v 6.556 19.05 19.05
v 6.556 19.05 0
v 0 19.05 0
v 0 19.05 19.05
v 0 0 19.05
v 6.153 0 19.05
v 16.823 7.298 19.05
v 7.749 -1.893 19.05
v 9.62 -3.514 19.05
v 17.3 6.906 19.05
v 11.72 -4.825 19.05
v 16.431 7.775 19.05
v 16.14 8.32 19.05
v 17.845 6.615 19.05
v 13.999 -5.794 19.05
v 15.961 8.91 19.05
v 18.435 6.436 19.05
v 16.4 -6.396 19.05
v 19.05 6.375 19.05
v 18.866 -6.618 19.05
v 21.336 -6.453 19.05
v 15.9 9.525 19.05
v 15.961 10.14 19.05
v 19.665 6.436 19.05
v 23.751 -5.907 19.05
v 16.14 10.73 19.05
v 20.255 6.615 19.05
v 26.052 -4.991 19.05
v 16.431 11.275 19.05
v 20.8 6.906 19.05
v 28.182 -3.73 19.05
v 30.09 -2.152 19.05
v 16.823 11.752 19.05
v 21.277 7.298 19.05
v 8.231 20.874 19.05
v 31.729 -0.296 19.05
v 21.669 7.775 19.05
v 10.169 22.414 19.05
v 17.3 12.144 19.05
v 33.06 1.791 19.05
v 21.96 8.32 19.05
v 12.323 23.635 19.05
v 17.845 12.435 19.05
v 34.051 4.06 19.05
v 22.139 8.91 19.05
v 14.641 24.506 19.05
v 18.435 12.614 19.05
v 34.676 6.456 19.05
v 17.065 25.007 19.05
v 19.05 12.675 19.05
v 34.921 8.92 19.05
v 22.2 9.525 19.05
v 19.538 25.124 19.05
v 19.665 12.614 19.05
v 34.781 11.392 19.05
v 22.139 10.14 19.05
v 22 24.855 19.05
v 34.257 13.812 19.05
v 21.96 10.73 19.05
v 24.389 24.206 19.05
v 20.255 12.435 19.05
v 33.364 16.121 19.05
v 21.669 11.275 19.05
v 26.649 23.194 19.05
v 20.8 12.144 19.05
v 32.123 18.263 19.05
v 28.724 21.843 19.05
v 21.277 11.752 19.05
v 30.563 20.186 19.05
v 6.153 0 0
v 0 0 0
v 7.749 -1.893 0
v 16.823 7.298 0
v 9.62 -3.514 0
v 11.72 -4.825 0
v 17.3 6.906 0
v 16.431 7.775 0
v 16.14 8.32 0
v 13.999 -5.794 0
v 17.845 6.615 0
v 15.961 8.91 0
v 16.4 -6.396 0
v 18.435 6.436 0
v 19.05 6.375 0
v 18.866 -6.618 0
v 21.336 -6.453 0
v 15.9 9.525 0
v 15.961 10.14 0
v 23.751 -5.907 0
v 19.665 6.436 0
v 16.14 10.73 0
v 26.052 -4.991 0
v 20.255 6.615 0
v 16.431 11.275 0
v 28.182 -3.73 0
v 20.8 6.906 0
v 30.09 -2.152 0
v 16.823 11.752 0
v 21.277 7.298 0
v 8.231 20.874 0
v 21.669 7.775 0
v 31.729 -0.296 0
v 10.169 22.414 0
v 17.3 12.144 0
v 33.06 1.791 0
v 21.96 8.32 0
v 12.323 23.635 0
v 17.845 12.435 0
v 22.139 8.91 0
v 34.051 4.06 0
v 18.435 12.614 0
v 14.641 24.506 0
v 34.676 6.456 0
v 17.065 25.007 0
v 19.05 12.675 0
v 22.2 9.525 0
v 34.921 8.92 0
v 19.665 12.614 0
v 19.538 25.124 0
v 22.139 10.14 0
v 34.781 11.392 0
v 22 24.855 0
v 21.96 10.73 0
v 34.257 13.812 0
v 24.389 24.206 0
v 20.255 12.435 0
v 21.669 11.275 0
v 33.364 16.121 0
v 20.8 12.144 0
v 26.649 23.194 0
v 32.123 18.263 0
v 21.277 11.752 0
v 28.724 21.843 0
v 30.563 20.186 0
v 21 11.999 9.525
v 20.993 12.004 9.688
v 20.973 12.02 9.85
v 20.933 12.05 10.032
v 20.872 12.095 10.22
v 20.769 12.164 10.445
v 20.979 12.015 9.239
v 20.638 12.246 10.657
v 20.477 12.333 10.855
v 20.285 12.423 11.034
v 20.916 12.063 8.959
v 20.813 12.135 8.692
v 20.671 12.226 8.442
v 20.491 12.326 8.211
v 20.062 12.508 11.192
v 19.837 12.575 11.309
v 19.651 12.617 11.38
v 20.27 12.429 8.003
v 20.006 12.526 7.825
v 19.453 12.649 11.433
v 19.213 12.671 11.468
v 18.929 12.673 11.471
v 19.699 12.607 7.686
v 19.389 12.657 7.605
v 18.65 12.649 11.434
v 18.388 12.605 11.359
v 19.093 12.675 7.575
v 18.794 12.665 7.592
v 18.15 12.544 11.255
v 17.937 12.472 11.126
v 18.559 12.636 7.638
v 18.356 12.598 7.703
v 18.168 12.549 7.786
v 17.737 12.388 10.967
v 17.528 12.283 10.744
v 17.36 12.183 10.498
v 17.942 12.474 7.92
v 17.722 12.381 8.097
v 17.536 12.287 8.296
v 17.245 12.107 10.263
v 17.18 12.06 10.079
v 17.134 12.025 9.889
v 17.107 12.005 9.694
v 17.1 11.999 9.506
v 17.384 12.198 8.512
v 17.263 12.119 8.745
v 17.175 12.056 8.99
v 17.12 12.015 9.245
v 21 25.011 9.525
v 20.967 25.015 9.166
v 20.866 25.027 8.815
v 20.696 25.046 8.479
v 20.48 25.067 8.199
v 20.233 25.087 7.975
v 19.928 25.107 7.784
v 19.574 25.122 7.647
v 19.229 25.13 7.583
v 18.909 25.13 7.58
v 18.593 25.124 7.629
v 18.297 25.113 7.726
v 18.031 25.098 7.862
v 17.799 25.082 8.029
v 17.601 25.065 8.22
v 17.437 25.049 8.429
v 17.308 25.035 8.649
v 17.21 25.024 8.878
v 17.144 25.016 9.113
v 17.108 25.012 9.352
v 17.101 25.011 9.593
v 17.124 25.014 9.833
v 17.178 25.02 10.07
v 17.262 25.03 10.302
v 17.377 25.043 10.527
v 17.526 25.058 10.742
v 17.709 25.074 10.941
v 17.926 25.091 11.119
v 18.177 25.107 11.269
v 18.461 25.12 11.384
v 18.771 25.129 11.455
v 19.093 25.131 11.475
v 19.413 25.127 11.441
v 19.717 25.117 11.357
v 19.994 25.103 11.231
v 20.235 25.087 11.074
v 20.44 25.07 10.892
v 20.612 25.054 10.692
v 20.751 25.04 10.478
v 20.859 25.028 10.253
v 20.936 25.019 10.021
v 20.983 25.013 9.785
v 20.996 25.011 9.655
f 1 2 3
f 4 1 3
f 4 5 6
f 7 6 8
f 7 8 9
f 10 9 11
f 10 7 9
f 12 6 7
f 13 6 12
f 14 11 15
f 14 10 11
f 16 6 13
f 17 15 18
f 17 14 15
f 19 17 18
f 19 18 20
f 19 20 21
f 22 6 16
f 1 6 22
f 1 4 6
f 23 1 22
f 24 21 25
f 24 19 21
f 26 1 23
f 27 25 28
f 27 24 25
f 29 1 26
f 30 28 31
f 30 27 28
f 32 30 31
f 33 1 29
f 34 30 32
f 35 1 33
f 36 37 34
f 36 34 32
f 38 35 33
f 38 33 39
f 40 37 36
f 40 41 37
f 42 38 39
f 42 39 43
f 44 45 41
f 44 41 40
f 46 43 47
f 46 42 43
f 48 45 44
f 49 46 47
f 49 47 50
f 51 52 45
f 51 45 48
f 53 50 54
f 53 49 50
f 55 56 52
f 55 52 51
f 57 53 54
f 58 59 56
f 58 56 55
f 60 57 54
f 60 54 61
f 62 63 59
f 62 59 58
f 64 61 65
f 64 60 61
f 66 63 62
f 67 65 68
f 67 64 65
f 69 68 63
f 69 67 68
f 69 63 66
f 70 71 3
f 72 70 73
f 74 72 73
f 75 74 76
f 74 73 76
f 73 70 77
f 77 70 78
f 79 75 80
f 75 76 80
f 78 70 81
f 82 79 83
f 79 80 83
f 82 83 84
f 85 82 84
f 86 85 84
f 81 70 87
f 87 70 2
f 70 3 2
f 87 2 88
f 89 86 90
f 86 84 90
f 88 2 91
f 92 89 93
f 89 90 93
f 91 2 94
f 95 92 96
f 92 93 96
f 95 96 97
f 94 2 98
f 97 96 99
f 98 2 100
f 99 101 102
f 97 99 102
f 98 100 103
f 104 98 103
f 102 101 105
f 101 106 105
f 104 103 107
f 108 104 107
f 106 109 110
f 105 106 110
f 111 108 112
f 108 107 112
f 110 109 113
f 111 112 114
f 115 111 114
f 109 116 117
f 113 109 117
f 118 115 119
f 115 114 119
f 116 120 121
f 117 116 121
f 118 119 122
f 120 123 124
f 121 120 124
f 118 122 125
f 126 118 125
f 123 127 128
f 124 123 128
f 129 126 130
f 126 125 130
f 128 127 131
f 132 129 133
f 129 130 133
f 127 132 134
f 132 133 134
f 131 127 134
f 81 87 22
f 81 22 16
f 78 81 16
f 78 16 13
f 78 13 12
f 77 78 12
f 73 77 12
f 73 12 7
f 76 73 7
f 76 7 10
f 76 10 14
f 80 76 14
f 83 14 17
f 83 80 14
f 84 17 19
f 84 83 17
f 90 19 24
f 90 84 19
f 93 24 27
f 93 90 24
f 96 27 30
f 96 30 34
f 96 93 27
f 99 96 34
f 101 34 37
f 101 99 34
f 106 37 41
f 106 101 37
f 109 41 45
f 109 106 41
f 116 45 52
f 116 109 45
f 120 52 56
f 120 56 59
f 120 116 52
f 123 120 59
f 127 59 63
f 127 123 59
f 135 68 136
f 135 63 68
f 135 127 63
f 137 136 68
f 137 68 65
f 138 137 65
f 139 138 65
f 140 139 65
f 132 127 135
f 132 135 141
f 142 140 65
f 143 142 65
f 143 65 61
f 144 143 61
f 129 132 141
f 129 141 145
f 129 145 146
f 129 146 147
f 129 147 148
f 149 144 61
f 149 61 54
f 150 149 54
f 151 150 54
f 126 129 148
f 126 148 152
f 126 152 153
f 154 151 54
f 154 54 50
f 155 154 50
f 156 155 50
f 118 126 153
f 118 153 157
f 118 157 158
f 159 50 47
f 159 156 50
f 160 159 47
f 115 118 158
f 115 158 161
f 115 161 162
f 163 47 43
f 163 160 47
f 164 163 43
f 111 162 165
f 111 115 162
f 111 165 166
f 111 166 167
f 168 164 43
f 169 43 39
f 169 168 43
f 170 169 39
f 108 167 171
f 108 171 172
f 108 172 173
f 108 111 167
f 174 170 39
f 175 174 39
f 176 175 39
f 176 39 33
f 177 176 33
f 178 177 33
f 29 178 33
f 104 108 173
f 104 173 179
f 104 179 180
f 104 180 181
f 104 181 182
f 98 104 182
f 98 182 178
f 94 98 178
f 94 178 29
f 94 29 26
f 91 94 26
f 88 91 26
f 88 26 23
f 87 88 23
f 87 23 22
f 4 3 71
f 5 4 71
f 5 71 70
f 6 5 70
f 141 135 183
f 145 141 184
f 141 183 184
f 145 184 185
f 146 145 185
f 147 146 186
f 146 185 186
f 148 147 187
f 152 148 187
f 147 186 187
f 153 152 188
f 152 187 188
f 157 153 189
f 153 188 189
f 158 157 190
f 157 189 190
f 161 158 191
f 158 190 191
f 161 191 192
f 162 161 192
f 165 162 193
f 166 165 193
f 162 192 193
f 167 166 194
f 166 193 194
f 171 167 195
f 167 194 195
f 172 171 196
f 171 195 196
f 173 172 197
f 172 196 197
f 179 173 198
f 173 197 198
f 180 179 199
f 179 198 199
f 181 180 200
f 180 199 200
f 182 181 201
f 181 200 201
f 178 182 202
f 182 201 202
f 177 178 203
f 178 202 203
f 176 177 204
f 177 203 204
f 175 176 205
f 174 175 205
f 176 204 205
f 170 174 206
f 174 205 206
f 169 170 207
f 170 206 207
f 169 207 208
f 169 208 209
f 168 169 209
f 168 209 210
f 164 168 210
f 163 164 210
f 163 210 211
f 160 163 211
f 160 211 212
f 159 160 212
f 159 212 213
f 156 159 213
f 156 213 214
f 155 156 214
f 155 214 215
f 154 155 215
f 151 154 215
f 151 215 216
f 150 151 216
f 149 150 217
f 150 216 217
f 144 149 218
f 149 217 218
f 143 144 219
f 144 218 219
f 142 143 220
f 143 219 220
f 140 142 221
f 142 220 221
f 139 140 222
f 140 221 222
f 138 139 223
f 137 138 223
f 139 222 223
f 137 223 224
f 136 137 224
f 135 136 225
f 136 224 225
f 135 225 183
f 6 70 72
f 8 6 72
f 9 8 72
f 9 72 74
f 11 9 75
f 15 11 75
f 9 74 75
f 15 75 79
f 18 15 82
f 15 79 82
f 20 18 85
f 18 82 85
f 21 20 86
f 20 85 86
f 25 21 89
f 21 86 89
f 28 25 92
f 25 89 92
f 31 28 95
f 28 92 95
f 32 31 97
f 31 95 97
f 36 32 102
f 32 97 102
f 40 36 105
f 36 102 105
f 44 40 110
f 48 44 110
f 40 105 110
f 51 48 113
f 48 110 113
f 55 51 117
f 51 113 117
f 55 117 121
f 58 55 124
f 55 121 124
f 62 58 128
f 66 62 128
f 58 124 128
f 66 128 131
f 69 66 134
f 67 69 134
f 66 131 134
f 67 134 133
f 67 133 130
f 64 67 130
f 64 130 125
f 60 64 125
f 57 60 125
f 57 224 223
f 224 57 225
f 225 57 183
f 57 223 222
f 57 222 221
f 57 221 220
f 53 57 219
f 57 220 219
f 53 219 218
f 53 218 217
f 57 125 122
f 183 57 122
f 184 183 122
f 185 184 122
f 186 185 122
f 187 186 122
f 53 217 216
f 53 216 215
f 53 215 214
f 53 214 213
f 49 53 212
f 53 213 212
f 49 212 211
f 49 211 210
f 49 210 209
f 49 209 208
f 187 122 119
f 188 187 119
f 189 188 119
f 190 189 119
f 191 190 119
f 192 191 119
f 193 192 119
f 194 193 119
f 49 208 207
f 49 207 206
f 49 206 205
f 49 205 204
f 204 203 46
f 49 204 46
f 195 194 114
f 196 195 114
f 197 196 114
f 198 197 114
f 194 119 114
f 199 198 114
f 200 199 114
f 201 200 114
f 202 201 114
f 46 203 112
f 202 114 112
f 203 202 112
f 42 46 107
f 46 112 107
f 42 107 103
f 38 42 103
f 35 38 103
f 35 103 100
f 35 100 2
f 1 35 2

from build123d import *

# Parameters (mm, degrees)
SKETCH1_R               = 3.15
BOSS_EXTRUDE1_DEPTH     = 19.05
CUT_EXTRUDE2_REACH      = 55.695
CUT_EXTRUDE2_END_RADIUS = 3.15
CUT_EXTRUDE2_START      = 6.35
SKETCH3_R               = 1.95


with BuildPart() as part:
    # Sketch1 → Boss-Extrude1 (new body)
    with BuildSketch(Plane.XY):
        with BuildLine():
            Line((0, 19.05), (0, 0))
            Line((0, 0), (6.152664584, 0))
            ThreePointArc((6.152664584, 0), (34.921438813, 8.919808212), (6.556238945, 19.05))
            Line((6.556238945, 19.05), (0, 19.05))
        make_face()
        with Locations((19.05, 9.525)):
            Circle(SKETCH1_R, mode=Mode.SUBTRACT)
    extrude(amount=BOSS_EXTRUDE1_DEPTH)

    # Cut-Extrude2: up to this cylinder (the profile starts outside it)
    cut_extrude2_end = Plane(origin=(19.05, 9.525, 9.525), z_dir=(0, 0, -1)) * Cylinder(CUT_EXTRUDE2_END_RADIUS, 118.69, mode=Mode.PRIVATE)
    # Sketch3 → Cut-Extrude2 (cut, up to the surface)
    with BuildSketch(Plane(origin=(0, 19.05, 0), x_dir=(1, 0, 0), z_dir=(0, 1, 0)).offset(CUT_EXTRUDE2_START), mode=Mode.PRIVATE) as cut_extrude2_sk1:
        with Locations((19.05, -9.525)):
            Circle(SKETCH3_R)
    cut_extrude2_tool1 = extrude(cut_extrude2_sk1.sketch, amount=-CUT_EXTRUDE2_REACH, mode=Mode.PRIVATE) - cut_extrude2_end
    add(cut_extrude2_tool1.solids().sort_by_distance((19.05, 25.4, 9.525))[0], mode=Mode.SUBTRACT)


solid = part.part
